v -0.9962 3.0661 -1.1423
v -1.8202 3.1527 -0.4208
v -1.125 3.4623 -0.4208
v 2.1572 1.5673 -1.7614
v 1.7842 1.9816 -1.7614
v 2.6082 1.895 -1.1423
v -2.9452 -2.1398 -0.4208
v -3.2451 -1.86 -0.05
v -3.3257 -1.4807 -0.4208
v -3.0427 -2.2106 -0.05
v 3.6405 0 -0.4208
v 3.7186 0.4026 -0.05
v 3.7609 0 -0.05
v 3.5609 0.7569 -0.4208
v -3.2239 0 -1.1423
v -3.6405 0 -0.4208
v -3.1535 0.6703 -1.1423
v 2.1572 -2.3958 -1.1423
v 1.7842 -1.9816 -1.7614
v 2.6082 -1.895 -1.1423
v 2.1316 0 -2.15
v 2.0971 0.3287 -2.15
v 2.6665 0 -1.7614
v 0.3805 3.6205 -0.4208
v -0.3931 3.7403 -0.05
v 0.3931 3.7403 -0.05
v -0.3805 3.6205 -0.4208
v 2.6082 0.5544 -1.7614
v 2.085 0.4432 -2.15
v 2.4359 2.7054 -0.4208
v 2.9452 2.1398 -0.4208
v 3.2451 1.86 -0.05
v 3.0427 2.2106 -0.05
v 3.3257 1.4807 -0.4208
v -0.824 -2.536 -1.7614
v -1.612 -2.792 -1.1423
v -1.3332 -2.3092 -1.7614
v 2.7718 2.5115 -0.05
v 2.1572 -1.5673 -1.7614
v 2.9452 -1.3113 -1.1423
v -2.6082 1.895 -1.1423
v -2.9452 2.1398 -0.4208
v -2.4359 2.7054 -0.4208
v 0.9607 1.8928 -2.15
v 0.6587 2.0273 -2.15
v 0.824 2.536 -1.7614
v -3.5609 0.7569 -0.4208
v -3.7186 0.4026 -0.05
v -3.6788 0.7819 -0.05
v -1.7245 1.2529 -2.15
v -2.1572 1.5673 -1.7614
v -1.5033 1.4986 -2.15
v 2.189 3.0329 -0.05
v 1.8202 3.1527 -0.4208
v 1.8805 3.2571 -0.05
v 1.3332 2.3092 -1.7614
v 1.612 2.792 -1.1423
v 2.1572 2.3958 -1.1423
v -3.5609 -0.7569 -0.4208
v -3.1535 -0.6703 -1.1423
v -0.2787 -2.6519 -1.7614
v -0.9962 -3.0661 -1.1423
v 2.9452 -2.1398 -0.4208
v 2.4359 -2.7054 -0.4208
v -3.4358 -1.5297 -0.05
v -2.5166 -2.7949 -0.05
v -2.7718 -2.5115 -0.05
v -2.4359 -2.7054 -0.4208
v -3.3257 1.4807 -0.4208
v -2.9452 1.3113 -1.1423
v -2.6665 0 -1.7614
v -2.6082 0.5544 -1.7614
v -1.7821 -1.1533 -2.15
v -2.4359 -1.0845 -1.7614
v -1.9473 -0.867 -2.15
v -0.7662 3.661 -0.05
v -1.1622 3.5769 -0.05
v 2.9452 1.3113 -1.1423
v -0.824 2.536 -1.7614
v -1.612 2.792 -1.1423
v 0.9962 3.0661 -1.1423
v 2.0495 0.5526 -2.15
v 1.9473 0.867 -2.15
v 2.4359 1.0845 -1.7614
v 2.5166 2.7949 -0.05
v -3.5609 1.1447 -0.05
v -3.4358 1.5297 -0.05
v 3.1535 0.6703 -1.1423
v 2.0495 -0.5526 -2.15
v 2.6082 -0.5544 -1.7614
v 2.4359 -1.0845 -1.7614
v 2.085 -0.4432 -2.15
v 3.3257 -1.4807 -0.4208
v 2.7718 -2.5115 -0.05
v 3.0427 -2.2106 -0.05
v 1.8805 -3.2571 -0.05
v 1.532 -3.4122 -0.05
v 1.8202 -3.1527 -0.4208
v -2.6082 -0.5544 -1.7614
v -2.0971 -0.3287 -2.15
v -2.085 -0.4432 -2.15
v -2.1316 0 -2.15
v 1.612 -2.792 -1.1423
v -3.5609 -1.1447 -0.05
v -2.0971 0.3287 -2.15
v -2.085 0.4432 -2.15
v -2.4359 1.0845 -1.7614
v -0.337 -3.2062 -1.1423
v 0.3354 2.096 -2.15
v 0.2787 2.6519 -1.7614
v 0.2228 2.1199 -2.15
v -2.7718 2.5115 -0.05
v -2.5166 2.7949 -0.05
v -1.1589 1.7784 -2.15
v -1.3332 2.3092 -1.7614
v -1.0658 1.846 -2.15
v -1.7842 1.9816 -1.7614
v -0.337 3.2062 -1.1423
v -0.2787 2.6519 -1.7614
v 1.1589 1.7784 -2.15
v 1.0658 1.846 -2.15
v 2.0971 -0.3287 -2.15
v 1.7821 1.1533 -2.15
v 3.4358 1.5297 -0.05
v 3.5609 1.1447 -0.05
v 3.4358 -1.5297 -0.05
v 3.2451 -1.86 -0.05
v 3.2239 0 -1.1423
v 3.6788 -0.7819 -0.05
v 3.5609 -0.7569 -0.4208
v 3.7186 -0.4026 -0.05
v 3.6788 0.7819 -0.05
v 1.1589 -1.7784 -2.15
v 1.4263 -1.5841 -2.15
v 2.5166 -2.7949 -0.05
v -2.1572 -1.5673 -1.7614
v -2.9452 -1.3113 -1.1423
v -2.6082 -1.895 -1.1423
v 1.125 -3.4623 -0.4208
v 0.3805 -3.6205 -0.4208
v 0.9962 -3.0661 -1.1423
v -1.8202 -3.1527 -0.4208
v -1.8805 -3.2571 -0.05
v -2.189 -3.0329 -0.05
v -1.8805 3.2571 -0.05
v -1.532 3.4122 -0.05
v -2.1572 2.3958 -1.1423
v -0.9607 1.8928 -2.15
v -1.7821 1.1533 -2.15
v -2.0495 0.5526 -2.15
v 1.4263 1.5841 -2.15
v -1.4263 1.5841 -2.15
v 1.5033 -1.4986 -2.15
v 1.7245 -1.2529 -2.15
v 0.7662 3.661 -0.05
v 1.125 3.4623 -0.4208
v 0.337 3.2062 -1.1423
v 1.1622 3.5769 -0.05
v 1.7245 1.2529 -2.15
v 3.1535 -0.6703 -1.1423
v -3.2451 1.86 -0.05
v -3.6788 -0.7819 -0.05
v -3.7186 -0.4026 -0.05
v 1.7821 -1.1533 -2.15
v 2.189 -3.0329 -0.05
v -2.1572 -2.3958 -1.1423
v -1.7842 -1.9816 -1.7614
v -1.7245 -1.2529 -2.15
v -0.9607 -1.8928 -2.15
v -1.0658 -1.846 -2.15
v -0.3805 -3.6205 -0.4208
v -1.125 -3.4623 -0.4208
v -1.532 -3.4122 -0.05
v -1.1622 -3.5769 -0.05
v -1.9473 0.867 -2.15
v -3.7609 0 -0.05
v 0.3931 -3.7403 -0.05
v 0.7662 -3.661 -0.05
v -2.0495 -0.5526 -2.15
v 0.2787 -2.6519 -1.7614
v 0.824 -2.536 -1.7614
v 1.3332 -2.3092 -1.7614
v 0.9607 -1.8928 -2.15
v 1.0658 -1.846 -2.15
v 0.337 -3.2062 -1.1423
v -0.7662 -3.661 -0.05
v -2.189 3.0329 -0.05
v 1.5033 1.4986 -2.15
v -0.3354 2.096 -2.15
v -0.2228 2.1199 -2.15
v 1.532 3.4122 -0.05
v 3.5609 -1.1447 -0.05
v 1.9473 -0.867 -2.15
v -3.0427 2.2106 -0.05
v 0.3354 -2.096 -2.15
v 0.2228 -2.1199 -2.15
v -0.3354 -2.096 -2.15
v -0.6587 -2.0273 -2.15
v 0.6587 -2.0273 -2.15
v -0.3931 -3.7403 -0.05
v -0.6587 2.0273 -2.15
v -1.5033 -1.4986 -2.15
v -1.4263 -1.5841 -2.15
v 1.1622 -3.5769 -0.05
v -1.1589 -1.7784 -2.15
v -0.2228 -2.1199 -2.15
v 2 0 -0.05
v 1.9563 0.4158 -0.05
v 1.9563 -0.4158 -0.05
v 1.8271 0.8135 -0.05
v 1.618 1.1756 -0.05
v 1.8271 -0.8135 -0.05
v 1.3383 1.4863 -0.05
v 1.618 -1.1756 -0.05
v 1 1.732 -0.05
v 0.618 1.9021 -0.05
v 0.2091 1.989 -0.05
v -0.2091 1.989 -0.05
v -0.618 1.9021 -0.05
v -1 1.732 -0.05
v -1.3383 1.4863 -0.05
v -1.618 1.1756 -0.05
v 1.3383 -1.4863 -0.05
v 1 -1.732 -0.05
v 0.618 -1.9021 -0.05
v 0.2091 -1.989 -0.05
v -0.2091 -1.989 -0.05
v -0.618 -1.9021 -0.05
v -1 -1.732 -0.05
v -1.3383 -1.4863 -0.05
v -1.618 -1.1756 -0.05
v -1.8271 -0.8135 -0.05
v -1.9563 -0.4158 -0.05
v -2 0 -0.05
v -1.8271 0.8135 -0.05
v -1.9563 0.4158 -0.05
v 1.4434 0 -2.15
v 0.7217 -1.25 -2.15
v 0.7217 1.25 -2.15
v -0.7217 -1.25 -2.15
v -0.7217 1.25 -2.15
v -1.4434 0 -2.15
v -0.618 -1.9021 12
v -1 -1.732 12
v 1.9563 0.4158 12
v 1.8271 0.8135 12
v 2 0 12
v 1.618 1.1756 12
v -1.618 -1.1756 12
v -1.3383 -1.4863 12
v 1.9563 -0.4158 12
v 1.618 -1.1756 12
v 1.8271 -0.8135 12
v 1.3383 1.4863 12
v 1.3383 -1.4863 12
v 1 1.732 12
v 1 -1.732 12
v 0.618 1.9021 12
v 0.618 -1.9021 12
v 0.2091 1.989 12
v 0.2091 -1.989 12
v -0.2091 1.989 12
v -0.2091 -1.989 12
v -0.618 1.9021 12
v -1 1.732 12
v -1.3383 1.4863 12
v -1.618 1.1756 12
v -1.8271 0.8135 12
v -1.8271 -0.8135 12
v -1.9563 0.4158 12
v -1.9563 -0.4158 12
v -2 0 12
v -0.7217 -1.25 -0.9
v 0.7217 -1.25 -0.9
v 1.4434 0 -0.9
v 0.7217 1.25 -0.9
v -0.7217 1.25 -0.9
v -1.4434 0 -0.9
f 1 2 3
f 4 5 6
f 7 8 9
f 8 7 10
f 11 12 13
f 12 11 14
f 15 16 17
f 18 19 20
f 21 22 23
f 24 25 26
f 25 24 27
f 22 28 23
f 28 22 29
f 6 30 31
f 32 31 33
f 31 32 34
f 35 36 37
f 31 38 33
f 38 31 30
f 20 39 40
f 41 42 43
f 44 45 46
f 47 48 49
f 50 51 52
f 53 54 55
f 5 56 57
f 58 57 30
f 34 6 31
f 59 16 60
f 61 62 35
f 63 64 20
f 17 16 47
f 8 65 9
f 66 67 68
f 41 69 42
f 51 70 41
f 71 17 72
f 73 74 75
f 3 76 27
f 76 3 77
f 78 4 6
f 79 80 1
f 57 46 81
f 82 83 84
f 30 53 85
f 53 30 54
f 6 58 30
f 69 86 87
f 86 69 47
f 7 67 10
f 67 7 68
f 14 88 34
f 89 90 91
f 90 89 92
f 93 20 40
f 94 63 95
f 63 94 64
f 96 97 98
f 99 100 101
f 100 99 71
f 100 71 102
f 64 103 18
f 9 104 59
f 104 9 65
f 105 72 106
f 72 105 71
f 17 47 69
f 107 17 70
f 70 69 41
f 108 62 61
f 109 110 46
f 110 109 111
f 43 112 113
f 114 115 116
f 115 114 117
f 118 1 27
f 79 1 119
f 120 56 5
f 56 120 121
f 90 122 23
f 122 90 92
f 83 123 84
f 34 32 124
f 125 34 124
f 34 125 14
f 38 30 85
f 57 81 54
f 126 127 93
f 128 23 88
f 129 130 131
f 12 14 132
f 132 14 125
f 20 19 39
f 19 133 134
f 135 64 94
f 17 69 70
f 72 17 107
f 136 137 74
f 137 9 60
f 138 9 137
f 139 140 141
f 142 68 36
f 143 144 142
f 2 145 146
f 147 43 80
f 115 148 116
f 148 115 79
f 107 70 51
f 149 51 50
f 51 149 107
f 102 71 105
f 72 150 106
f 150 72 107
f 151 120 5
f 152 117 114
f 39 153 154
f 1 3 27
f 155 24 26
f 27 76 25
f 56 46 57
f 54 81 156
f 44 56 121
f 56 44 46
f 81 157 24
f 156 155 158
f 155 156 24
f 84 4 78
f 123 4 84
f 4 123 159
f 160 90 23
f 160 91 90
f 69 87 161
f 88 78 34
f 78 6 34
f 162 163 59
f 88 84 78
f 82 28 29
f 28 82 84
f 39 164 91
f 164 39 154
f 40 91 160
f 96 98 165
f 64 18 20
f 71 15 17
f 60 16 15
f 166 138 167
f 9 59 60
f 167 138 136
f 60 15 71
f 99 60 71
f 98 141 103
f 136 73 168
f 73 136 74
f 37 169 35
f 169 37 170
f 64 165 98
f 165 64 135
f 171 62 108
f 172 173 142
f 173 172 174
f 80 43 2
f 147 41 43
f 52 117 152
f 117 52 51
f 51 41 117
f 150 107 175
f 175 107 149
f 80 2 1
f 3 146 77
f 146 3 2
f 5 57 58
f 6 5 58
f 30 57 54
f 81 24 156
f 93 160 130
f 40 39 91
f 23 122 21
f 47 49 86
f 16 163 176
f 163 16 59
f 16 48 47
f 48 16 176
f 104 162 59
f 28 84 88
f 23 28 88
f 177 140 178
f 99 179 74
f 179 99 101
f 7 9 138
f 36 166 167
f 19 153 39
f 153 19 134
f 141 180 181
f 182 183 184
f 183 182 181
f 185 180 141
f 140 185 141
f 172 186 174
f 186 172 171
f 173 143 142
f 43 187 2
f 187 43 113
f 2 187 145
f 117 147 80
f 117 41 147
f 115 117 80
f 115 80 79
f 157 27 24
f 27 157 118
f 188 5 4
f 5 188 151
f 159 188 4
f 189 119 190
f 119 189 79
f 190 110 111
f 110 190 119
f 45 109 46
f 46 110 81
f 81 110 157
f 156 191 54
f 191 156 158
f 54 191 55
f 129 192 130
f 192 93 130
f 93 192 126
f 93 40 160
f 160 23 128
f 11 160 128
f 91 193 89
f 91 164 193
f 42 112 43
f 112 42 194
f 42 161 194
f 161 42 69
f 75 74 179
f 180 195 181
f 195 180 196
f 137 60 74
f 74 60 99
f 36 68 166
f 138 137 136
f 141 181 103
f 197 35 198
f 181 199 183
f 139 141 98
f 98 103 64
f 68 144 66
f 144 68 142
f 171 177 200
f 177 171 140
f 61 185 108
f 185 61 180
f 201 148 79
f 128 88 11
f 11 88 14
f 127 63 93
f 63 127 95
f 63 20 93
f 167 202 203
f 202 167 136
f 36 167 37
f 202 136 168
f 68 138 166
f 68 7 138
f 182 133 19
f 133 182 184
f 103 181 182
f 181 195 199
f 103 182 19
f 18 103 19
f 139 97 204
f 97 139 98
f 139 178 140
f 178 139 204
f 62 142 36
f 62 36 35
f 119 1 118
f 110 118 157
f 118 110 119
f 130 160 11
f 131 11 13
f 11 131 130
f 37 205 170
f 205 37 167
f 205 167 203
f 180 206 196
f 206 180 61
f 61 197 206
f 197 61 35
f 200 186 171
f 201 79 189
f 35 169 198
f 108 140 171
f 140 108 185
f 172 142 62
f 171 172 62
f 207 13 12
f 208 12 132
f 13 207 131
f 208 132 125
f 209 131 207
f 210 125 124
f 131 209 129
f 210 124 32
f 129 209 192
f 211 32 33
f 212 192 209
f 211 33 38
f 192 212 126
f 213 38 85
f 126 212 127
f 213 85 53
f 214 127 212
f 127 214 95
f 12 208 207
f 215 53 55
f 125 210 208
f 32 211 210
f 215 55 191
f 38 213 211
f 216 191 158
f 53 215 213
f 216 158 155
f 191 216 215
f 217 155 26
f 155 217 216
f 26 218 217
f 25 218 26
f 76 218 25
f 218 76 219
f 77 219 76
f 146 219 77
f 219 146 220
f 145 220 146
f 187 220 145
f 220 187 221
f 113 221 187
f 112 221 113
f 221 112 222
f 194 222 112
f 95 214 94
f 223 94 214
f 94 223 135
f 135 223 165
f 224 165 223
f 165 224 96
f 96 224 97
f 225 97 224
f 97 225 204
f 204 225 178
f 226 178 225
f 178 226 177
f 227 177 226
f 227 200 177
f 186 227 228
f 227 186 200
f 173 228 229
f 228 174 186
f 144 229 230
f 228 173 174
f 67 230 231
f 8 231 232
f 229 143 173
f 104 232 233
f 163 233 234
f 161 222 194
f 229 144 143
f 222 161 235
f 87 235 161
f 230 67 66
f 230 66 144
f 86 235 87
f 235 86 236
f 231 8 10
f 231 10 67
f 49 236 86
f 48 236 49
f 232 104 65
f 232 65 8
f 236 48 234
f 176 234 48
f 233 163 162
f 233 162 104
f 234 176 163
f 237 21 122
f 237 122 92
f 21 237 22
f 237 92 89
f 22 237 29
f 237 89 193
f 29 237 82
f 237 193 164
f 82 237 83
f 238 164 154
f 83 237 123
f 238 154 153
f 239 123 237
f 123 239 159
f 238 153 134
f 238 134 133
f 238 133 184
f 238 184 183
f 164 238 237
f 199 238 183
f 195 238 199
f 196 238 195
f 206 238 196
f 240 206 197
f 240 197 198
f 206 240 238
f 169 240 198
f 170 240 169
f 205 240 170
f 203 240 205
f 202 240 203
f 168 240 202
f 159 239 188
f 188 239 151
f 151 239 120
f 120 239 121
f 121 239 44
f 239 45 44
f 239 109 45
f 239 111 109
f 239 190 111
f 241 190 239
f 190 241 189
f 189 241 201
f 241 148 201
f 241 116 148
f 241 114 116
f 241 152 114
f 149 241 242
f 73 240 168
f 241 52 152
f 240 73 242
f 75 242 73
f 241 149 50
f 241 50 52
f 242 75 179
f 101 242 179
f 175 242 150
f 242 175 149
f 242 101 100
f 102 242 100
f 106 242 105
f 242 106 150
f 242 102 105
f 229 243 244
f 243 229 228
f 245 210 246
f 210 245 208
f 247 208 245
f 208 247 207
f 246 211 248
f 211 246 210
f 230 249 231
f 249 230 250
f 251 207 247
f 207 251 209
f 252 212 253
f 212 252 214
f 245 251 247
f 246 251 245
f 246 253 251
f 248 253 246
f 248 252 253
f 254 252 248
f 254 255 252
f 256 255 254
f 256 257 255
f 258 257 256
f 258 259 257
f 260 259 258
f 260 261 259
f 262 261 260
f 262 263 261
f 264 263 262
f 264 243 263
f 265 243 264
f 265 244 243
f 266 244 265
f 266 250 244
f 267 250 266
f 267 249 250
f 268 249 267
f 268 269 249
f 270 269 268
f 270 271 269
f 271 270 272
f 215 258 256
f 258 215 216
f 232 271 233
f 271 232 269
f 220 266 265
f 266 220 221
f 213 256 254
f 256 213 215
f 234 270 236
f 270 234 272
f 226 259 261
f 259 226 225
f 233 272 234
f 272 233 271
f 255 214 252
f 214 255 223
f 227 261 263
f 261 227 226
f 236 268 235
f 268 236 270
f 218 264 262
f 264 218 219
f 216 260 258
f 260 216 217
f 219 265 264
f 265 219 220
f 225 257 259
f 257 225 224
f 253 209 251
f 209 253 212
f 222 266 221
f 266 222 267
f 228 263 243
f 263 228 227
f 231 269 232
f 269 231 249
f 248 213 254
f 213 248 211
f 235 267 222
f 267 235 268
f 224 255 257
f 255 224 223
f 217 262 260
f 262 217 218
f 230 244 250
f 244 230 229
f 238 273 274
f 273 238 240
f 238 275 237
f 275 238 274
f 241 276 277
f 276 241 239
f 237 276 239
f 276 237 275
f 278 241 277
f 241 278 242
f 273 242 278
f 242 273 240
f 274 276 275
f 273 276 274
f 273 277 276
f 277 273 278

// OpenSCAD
/*
   Copyright 2018 Scott Bezek and the splitflap contributors

   Licensed under the Apache License, Version 2.0 (the "License");
   you may not use this file except in compliance with the License.
   You may obtain a copy of the License at

       http://www.apache.org/licenses/LICENSE-2.0

   Unless required by applicable law or agreed to in writing, software
   distributed under the License is distributed on an "AS IS" BASIS,
   WITHOUT WARRANTIES OR CONDITIONS OF ANY KIND, either express or implied.
   See the License for the specific language governing permissions and
   limitations under the License.
*/

module roughM4_7380(length) {
    eps = 0.1;
    thread_diameter = 4;
    head_diameter = 7.6;
    head_length = 2.2;
    driving_depth = 1.3;
    driving_apothem = 2.5/2;
    driving_radius = driving_apothem / cos(180/6);

    sphere_offset = 1.2;  // Just a guess
    sphere_radius = sqrt(sphere_offset*sphere_offset + (head_diameter/2)*(head_diameter/2));


    difference() {
        union() {
            translate([0, 0, -eps]) {
                cylinder(h=length+eps, d=thread_diameter, $fn=30);
            }
            difference() {
                translate([0, 0, sphere_offset]) {
                    sphere(sphere_radius, $fn=30);
                }
                translate([0, 0, sphere_radius]) {
                    cube([sphere_radius*2 + eps, sphere_radius*2 + eps, sphere_radius*2 + eps], center=true);
                }
                translate([0, 0, -sphere_radius - head_length]) {
                    cube([sphere_radius*2 + eps, sphere_radius*2 + eps, sphere_radius*2 + eps], center=true);
                }
            }
        }
        translate([0, 0, -head_length-eps]) {
            cylinder(h=driving_depth+eps, r=driving_radius, $fn=6);
        }
    }
}

roughM4_7380(12);

        module color_selector(c) {
            precision = 0.0000001;  // arbitrary
            function compare_floats(x, y, i=0) = 
                  (len(x) != len(y)) ? false  // if arrays differ in length, they can't be equal
                : (i >= len(x)) ? true  // if we've hit the end of the arrays without issue, we're equal
                : (x[i] - precision <= y[i]) && x[i] + precision >= y[i]
                    ? compare_floats(x, y, i+1)
                    : false;  // not equal, short circuit

            if (c == [0.7, 0.7, 0.7] || compare_floats(c, [0.7, 0.7, 0.7]))
                children();
        }
                    
